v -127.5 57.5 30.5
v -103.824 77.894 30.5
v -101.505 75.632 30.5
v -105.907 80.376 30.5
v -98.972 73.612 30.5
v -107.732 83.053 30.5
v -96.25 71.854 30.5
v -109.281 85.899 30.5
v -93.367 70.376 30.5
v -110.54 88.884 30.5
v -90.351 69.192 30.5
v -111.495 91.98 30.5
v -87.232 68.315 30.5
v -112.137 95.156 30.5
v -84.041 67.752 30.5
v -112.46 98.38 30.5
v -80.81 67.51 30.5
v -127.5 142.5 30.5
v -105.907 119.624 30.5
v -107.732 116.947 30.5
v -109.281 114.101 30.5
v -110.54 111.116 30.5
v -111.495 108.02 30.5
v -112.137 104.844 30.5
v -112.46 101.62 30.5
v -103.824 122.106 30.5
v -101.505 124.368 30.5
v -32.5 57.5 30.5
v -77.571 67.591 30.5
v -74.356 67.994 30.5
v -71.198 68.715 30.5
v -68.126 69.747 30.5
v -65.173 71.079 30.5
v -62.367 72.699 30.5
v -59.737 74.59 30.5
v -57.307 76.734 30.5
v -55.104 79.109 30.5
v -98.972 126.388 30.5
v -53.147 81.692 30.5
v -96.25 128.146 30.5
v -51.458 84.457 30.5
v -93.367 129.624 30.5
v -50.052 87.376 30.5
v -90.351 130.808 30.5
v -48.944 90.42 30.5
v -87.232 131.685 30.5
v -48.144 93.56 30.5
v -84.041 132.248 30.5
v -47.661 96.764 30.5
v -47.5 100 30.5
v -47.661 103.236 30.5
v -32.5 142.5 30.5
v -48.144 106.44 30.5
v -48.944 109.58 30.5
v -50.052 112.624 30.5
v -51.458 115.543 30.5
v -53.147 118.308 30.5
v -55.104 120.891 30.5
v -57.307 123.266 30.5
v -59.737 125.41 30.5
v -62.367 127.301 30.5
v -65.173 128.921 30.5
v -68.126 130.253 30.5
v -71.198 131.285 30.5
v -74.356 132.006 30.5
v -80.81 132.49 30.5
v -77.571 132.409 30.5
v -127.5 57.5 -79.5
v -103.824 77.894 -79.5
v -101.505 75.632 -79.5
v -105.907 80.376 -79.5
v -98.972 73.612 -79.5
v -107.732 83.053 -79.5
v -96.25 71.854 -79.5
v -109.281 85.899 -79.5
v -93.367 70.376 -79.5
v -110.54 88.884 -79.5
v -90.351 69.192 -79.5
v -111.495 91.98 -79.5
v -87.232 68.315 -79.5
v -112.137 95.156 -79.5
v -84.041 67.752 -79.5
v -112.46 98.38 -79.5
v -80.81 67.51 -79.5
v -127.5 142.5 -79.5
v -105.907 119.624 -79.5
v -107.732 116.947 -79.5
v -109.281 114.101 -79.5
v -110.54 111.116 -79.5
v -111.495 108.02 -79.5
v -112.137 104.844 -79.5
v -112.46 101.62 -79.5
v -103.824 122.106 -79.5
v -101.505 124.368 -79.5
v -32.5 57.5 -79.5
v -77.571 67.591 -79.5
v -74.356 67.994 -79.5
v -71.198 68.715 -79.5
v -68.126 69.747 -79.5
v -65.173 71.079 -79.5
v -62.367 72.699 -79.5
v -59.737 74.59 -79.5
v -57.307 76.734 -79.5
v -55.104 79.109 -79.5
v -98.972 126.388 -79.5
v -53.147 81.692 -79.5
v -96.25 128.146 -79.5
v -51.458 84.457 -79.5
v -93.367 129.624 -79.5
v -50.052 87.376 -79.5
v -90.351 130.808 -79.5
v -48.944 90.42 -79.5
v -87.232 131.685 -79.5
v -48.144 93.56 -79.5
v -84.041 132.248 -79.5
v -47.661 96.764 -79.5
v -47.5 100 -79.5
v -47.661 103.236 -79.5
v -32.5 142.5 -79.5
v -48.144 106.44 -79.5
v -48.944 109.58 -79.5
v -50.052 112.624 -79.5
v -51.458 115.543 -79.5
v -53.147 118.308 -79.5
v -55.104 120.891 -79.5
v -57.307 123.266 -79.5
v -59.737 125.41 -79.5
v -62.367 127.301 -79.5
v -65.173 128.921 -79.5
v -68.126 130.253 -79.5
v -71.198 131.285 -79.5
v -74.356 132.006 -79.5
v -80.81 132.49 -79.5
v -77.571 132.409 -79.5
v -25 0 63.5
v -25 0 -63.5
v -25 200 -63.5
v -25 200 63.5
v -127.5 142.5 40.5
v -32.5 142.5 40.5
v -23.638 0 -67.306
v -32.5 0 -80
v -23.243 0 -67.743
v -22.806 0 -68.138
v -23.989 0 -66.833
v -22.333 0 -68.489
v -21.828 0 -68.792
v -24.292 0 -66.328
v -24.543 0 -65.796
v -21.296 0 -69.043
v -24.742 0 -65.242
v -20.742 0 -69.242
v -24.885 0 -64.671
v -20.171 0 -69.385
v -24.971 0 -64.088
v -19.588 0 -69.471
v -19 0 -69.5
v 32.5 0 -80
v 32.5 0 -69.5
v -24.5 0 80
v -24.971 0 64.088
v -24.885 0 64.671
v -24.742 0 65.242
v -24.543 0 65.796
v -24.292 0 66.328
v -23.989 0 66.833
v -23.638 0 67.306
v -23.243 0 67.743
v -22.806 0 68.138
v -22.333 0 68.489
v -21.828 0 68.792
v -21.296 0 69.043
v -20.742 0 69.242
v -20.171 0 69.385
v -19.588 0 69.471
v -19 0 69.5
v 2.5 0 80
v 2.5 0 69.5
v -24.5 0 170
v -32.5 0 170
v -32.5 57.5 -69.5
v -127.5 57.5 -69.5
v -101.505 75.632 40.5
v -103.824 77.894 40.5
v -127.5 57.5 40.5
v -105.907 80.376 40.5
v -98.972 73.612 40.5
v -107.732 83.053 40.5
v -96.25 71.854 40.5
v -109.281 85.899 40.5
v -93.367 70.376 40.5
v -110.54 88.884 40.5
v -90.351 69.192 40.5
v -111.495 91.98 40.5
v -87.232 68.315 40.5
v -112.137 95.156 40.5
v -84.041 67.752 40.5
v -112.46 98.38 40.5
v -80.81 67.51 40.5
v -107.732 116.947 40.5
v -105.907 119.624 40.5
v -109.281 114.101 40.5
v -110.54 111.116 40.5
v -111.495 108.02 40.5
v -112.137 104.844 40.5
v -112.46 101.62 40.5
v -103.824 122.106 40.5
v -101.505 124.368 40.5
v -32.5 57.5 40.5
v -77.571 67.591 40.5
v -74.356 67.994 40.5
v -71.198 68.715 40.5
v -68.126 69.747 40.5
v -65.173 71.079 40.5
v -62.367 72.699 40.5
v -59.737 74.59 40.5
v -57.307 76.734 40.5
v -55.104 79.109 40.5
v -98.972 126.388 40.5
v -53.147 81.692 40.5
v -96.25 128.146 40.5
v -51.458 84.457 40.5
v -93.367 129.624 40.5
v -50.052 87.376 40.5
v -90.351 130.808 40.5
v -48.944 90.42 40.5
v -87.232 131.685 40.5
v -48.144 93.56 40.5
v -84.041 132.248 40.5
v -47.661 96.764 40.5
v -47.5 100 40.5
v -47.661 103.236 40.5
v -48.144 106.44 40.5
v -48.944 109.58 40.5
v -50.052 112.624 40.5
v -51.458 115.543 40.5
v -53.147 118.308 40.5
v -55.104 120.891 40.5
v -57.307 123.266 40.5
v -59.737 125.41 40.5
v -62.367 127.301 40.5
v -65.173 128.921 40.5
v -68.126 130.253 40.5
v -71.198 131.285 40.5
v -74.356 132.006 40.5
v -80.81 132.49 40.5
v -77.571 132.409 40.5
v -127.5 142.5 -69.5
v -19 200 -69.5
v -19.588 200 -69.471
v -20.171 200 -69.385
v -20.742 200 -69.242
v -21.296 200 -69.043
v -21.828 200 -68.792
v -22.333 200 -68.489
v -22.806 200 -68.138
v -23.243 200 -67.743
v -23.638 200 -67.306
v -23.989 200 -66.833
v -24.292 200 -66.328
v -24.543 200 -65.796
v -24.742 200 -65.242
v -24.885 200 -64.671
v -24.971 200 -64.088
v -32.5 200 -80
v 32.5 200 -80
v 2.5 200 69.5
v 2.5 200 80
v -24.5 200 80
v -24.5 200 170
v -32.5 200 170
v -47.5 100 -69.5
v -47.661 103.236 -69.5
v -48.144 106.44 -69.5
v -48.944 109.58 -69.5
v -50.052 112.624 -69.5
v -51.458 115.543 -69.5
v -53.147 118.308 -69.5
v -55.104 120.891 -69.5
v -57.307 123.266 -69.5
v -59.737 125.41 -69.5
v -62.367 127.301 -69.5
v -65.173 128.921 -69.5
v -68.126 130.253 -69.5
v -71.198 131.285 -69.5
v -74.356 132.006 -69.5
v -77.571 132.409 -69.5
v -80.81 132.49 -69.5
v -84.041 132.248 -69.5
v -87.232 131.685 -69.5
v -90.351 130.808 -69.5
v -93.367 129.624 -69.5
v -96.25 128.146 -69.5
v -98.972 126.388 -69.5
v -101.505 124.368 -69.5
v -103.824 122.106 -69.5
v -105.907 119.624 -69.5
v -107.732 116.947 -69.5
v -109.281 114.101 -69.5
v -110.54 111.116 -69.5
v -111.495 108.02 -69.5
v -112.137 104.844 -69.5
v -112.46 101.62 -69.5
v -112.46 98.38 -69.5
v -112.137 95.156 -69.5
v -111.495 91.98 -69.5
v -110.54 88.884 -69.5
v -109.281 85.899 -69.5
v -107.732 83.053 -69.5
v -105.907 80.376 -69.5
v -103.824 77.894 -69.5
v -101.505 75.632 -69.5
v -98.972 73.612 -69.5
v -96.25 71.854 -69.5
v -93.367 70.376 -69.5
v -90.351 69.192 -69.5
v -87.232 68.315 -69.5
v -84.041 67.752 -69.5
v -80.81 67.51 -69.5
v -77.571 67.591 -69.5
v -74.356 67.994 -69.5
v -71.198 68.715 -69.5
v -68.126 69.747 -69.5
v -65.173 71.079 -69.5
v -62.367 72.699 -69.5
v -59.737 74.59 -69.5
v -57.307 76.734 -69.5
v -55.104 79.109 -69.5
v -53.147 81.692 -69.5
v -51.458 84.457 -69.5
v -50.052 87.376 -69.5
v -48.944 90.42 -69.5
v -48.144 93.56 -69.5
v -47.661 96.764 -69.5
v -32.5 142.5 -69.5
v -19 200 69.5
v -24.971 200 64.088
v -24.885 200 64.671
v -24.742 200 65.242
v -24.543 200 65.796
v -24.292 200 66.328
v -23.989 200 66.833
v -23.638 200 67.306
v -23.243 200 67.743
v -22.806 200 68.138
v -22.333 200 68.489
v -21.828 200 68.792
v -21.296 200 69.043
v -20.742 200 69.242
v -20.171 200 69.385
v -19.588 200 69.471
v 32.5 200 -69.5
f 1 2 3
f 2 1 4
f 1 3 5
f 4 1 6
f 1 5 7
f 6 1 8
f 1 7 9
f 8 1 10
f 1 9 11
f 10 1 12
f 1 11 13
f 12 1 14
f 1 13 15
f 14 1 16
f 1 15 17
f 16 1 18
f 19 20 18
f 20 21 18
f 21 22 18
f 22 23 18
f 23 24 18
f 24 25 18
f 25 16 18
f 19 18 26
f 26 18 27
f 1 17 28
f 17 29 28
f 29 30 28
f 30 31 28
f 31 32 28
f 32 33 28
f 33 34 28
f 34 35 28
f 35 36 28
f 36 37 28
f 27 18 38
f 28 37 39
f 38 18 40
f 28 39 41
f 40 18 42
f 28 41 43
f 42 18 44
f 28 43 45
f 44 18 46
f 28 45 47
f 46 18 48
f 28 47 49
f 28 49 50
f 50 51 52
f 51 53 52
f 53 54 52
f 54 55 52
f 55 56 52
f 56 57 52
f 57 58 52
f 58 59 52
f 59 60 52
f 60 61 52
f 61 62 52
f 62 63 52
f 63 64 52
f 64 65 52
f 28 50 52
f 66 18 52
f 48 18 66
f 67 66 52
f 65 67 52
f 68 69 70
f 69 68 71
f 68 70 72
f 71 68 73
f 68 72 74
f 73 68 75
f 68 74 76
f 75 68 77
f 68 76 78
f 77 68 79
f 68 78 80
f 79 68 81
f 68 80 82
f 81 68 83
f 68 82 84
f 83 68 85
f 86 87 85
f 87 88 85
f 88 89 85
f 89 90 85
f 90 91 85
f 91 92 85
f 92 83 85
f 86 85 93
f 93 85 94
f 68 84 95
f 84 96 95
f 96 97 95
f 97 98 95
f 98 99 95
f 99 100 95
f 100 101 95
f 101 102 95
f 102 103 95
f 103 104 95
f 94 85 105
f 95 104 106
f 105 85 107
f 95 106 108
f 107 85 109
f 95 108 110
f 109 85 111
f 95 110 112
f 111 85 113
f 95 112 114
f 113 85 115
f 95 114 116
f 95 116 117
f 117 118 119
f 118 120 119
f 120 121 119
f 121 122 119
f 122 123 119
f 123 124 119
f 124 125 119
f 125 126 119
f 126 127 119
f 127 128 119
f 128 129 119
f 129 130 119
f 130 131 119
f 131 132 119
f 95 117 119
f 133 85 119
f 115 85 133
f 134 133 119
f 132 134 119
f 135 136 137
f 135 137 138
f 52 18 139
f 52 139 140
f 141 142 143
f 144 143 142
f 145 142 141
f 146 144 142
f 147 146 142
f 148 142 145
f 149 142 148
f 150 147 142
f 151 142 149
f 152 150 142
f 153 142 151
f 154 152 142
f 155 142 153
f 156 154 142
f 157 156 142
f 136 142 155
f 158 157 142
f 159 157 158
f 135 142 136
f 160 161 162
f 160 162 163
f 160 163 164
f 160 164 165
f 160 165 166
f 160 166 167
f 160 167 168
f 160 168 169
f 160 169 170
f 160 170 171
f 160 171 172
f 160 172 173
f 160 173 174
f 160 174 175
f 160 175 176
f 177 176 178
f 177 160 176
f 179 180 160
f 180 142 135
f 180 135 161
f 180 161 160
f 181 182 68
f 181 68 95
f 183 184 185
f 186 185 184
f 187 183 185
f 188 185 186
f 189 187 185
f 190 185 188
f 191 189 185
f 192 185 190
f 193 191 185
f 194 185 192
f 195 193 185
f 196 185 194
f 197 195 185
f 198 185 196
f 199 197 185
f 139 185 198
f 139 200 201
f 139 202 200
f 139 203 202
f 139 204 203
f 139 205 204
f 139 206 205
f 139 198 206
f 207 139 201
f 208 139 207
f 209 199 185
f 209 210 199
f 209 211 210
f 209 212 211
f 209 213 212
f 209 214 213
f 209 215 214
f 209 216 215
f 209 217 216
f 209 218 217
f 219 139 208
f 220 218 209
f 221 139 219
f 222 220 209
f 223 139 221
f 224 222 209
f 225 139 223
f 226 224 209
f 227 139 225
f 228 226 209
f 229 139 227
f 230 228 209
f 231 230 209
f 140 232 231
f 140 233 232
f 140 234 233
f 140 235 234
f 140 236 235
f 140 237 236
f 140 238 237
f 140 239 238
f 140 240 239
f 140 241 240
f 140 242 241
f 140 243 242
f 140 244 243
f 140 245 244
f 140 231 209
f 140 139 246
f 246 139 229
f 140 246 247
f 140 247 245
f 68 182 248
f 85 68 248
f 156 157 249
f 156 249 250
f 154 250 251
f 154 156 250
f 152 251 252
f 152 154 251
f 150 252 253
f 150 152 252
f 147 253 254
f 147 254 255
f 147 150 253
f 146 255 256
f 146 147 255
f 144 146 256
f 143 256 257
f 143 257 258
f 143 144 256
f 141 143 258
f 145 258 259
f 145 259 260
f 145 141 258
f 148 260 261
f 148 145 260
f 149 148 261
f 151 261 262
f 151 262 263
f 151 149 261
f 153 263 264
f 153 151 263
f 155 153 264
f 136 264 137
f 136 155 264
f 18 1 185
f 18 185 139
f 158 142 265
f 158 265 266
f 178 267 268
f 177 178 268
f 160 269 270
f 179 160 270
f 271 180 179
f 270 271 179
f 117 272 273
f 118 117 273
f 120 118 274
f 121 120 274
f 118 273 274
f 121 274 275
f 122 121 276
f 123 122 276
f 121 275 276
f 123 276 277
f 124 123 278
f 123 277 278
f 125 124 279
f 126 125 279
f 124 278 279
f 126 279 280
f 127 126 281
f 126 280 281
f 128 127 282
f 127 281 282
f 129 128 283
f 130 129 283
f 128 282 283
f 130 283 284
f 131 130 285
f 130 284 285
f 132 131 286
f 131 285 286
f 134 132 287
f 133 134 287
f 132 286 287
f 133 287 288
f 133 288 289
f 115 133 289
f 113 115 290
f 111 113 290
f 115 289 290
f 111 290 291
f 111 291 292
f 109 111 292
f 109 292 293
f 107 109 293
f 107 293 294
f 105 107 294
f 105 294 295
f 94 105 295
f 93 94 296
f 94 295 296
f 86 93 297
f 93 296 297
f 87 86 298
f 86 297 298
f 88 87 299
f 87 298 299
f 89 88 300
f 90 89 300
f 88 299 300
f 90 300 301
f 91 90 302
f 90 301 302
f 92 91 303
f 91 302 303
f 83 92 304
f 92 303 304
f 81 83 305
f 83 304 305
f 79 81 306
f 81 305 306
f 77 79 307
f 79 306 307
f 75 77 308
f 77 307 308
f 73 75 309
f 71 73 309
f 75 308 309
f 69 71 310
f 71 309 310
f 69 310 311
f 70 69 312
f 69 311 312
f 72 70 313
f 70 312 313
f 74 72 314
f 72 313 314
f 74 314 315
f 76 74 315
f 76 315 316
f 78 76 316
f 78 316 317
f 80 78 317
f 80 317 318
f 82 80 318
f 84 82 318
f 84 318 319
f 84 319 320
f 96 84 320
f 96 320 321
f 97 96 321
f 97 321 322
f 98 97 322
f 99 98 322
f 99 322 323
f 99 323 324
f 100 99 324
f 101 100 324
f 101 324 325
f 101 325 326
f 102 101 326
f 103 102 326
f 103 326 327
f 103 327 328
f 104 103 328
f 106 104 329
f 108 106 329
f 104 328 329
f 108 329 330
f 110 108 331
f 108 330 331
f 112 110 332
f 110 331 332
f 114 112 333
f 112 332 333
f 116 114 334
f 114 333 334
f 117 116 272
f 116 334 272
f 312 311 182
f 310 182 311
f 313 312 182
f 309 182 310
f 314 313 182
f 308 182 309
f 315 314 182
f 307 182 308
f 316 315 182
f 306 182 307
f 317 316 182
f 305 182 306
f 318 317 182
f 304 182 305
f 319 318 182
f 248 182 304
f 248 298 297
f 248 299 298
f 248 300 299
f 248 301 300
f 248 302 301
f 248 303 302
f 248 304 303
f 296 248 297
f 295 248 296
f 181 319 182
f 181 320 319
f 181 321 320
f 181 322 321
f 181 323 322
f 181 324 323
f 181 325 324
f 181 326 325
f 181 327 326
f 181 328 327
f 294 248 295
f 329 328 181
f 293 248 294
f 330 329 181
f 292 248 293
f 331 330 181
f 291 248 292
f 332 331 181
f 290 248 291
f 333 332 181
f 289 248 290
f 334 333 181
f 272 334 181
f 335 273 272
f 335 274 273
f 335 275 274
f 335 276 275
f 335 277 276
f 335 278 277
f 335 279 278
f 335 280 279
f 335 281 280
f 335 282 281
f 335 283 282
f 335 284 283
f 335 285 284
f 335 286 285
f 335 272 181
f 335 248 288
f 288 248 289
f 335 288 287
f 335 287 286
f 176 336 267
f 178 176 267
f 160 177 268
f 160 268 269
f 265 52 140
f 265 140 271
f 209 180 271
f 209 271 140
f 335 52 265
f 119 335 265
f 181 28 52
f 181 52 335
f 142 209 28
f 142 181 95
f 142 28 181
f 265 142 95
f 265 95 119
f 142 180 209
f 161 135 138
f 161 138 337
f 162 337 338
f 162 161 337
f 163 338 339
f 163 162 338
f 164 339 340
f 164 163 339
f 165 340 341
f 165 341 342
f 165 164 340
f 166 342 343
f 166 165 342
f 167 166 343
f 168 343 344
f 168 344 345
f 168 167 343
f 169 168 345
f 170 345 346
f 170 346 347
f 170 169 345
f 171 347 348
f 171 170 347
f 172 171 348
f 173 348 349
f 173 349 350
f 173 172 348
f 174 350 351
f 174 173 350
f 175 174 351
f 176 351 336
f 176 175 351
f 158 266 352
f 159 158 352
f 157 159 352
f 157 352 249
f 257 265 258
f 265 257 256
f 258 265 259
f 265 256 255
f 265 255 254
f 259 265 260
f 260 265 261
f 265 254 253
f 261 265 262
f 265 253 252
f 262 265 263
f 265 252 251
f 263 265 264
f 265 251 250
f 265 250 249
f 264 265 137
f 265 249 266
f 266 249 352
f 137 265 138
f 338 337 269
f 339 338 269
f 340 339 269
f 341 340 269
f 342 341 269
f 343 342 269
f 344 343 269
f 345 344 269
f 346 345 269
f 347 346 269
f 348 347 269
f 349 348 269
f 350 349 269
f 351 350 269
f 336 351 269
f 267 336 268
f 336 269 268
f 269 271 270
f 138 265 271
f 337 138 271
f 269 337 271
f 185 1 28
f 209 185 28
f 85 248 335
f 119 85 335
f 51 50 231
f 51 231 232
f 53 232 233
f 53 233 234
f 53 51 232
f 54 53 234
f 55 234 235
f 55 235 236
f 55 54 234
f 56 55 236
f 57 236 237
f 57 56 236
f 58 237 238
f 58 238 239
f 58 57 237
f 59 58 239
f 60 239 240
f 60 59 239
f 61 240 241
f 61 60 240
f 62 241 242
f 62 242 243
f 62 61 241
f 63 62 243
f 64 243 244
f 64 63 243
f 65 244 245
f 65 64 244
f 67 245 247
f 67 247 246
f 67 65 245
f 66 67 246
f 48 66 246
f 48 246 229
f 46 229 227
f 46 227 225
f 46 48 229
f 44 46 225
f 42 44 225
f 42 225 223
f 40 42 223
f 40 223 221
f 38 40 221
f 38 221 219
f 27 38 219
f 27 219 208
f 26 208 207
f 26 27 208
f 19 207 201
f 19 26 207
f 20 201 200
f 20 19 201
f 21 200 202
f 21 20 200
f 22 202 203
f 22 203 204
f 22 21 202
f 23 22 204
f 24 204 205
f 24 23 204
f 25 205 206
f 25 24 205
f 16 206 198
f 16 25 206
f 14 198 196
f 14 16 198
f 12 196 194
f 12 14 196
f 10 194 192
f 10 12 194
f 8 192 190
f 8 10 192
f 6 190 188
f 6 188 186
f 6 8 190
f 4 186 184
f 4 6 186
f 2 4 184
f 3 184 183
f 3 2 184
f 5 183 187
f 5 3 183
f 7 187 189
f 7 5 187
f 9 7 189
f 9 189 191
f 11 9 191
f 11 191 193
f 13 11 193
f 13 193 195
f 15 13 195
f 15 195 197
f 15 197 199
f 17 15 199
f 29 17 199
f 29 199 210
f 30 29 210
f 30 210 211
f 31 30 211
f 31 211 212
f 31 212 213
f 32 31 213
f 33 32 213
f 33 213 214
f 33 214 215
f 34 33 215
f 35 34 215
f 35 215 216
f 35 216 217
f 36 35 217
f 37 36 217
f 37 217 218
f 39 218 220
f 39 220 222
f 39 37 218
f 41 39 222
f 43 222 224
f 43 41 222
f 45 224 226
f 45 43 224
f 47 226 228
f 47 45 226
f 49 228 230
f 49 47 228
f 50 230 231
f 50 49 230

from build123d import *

# Parameters (mm, degrees)
F0_W     = 8
F0_H     = 90
F1_DEPTH = 200
F3_W     = 95
F3_H     = 85
F3_R     = 32.5
F4_DEPTH = 10
F6_W     = 95
F6_H     = 85
F6_R     = 32.5
F7_DEPTH = 10


with BuildPart() as f1:
    # F0 (on Front) → F1 (new body)
    with BuildSketch(Plane.XZ):
        with BuildLine():
            Line((2.5, 69.5), (2.5, 80))
            Line((2.5, 80), (-24.5, 80))
            Line((-24.5, 80), (-32.5, 80))
            Line((-32.5, 80), (-32.5, -80))
            Line((-32.5, -80), (32.5, -80))
            Line((32.5, -80), (32.5, -69.5))
            Line((32.5, -69.5), (-19, -69.5))
            ThreePointArc((-19, -69.5), (-23.2426406871, -67.7426406871), (-25, -63.5))
            Line((-25, -63.5), (-25, 63.5))
            ThreePointArc((-25, 63.5), (-23.2426406871, 67.7426406871), (-19, 69.5))
            Line((-19, 69.5), (2.5, 69.5))
        make_face()
        with Locations((-28.5, 125)):
            Rectangle(F0_W, F0_H)
    extrude(amount=-F1_DEPTH)

    # F3 (on offset) → F4 (join)
    with BuildSketch(Plane.XY.offset(-69.5)):
        with Locations((-80, 100)):
            Rectangle(F3_W, F3_H)
        with Locations((-80, 100)):
            Circle(F3_R, mode=Mode.SUBTRACT)
    extrude(amount=-F4_DEPTH)

    # F6 (on offset) → F7 (join)
    with BuildSketch(Plane.XY.offset(30.5)):
        with Locations((-80, 100)):
            Rectangle(F6_W, F6_H)
        with Locations((-80, 100)):
            Circle(F6_R, mode=Mode.SUBTRACT)
    extrude(amount=F7_DEPTH)


solid = f1.part
